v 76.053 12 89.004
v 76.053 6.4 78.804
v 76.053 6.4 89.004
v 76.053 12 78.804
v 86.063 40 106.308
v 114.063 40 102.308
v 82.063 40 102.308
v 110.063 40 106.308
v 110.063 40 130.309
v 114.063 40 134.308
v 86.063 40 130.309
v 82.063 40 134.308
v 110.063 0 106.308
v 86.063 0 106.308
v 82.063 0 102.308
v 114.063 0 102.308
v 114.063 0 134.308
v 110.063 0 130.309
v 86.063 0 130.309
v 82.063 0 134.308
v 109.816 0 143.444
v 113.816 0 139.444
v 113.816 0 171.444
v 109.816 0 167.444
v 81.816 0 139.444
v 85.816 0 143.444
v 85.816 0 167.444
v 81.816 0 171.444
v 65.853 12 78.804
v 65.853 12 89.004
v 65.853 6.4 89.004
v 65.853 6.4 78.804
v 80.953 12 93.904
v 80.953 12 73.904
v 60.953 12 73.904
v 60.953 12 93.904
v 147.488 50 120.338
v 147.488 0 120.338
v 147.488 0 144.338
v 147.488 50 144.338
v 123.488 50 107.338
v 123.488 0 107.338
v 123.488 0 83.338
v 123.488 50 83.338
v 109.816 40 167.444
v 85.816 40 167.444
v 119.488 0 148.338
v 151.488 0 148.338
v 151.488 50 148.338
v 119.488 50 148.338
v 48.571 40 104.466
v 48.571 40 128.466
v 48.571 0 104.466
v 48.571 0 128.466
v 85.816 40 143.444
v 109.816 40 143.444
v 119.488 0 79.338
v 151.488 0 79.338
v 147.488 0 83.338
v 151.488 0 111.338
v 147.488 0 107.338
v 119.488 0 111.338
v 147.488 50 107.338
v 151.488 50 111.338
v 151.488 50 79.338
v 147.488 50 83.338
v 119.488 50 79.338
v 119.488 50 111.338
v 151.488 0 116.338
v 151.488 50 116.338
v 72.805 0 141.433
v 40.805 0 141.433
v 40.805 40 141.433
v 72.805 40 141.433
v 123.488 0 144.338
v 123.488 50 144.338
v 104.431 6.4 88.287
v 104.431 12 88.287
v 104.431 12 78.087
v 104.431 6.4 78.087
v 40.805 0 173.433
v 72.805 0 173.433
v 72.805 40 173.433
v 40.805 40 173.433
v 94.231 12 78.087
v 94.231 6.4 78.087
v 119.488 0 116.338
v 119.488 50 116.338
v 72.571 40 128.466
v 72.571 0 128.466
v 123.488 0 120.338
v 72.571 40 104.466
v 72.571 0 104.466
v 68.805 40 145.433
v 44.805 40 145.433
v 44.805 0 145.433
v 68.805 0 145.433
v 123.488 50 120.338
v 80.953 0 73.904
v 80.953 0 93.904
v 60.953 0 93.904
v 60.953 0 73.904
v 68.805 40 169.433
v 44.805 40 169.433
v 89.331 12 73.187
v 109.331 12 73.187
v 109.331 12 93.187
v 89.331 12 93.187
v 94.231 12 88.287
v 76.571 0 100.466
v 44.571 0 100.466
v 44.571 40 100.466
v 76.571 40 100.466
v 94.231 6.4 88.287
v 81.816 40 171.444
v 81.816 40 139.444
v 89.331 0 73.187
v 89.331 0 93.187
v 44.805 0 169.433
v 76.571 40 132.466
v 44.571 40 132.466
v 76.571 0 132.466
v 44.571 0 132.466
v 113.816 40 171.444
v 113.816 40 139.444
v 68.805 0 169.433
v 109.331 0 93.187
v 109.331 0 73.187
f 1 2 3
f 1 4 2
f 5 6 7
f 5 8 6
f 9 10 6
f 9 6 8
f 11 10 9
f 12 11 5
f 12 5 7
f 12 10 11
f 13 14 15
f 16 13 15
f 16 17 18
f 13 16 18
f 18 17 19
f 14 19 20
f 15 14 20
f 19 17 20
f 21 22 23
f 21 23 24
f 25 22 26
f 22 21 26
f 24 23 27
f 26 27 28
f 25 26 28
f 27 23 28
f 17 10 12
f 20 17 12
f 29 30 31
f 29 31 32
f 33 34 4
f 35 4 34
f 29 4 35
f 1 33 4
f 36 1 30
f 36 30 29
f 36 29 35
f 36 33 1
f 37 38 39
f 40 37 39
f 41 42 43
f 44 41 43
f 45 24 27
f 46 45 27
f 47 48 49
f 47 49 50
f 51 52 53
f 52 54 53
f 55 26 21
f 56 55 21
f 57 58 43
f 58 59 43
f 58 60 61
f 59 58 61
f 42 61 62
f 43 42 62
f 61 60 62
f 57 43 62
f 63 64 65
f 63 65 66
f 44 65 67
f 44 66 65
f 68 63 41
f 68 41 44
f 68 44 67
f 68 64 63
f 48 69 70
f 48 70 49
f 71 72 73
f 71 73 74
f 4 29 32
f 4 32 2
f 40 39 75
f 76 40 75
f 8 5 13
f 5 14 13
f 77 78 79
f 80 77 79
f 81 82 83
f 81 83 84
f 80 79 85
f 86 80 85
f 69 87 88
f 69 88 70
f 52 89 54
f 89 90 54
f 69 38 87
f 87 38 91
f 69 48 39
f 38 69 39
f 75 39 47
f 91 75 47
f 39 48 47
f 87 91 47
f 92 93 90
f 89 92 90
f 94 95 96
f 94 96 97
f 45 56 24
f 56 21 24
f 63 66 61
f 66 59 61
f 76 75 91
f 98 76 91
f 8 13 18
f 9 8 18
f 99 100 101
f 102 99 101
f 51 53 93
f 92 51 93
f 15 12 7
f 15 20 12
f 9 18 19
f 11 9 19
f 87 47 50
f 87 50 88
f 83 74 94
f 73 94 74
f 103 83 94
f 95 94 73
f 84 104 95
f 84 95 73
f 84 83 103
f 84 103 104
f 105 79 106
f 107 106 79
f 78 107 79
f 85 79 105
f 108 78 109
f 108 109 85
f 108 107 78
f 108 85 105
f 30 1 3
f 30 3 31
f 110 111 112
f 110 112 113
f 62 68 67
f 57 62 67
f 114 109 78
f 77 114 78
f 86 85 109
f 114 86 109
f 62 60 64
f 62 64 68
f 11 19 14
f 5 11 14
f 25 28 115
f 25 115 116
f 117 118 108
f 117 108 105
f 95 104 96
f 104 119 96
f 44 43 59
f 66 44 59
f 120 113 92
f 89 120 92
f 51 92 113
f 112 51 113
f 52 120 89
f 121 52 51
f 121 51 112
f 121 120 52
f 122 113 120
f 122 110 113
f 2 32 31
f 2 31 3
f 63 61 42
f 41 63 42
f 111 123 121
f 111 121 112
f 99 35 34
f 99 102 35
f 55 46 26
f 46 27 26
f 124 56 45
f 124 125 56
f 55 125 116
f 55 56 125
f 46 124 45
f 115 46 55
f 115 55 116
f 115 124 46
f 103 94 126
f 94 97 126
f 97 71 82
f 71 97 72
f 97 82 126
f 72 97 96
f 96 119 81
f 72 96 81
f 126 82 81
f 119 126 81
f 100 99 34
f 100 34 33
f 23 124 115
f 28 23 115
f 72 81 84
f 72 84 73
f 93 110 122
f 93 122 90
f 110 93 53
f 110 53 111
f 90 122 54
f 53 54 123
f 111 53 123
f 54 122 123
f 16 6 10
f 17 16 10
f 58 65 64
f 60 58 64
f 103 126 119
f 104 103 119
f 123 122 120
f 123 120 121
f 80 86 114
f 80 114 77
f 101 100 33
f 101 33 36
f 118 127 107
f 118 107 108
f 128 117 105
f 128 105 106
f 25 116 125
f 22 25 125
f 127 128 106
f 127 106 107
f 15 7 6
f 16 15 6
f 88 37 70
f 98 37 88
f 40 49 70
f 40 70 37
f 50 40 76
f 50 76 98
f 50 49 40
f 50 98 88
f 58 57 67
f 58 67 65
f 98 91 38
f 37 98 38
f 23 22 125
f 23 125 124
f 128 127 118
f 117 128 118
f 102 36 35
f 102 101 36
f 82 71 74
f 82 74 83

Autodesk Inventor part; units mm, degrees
ref_plane "YZ Plane" through (0, 0, 0) normal (1, 0, 0) x (0, 1, 0)
ref_plane "XZ Plane" through (0, 0, 0) normal (0, 1, 0) x (-1, 0, 0)
ref_plane "XY Plane" through (0, 0, 0) normal (0, 0, 1) x (1, 0, 0)
sketch "草圖1" plane through (0, 0, 0) normal (0, 1, 0) x (-1, 0, 0)
  circle A0 centre (0, 0) radius 7
  circle A1 centre (0, 0) radius 11
  line L0 (0, 0) -> (-26.517, 0)
  line L1 (0, 0) -> (0, 28.4195)
  circle A2 centre (-26, 0) radius 7
  circle A3 centre (-26, 0) radius 11
  circle A4 centre (0, 26) radius 7
  circle A5 centre (0, 26) radius 11
  circle A6 centre (-26, 26) radius 7
  circle A7 centre (-26, 26) radius 11
  dimension "d0" = 14
  dimension "d1" = 22
  dimension "d6" = 26
  dimension "d9" = 26
sketch "草圖6" plane through (0, 0, 0) normal (0, 1, 0) x (-1, 0, 0)
  point P0 (0, 0)
sketch "草圖9" plane through (0, 0, 0) normal (0, 1, 0) x (-1, 0, 0)
  line L0 (-119.4877, 79.3379) -> (-151.4877, 79.3379)
  line L1 (-151.4877, 79.3379) -> (-151.4877, 111.3379)
  line L2 (-151.4877, 111.3379) -> (-119.4877, 111.3379)
  line L3 (-119.4877, 111.3379) -> (-119.4877, 79.3379)
  line L4 (-123.4877, 83.3379) -> (-147.4877, 83.3379)
  line L5 (-147.4877, 83.3379) -> (-147.4877, 107.3379)
  line L6 (-147.4877, 107.3379) -> (-123.4877, 107.3379)
  line L7 (-123.4877, 107.3379) -> (-123.4877, 83.3379)
  line L8 (-123.4877, 83.3379) -> (-147.4877, 107.3379) construction
  line L9 (-147.4877, 83.3379) -> (-123.4877, 107.3379) construction
  line L10 (-119.4877, 116.3379) -> (-151.4877, 116.3379)
  line L11 (-151.4877, 116.3379) -> (-151.4877, 148.3379)
  line L12 (-151.4877, 148.3379) -> (-119.4877, 148.3379)
  line L13 (-119.4877, 148.3379) -> (-119.4877, 116.3379)
  line L14 (-123.4877, 120.3379) -> (-147.4877, 120.3379)
  line L15 (-147.4877, 120.3379) -> (-147.4877, 144.3379)
  line L16 (-147.4877, 144.3379) -> (-123.4877, 144.3379)
  line L17 (-123.4877, 144.3379) -> (-123.4877, 120.3379)
  line L18 (-123.4877, 120.3379) -> (-147.4877, 144.3379) construction
  line L19 (-147.4877, 120.3379) -> (-123.4877, 144.3379) construction
  line L20 (-82.0628, 102.3085) -> (-114.0628, 102.3085)
  line L21 (-114.0628, 102.3085) -> (-114.0628, 134.3085)
  line L22 (-114.0628, 134.3085) -> (-82.0628, 134.3085)
  line L23 (-82.0628, 134.3085) -> (-82.0628, 102.3085)
  line L24 (-86.0628, 106.3085) -> (-110.0628, 106.3085)
  line L25 (-110.0628, 106.3085) -> (-110.0628, 130.3085)
  line L26 (-110.0628, 130.3085) -> (-86.0628, 130.3085)
  line L27 (-86.0628, 130.3085) -> (-86.0628, 106.3085)
  line L28 (-86.0628, 102.6348) -> (-110.0628, 126.6348) construction
  line L29 (-110.0628, 102.6348) -> (-86.0628, 126.6348) construction
  line L30 (35.5473, 81.3984) -> (3.5473, 81.3984)
  line L31 (3.5473, 81.3984) -> (3.5473, 113.3984)
  line L32 (3.5473, 113.3984) -> (35.5473, 113.3984)
  line L33 (35.5473, 113.3984) -> (35.5473, 81.3984)
  line L34 (31.5472, 85.3984) -> (7.5472, 85.3984)
  line L35 (7.5472, 85.3984) -> (7.5472, 109.3984)
  line L36 (7.5472, 109.3984) -> (31.5472, 109.3984)
  line L37 (31.5472, 109.3984) -> (31.5472, 85.3984)
  line L38 (31.5472, 85.3984) -> (7.5472, 109.3984) construction
  line L39 (7.5472, 85.3984) -> (31.5472, 109.3984) construction
  line L40 (34.8593, 41.843) -> (2.8593, 41.843)
  line L41 (30.8593, 45.843) -> (6.8593, 45.843)
  line L42 (6.8593, 45.843) -> (6.8593, 69.843)
  line L43 (2.8593, 41.843) -> (2.8593, 73.843)
  line L44 (6.8593, 69.843) -> (30.8593, 69.843)
  line L45 (30.8593, 45.843) -> (6.8593, 69.843) construction
  line L46 (6.8593, 45.843) -> (30.8593, 69.843) construction
  line L47 (2.8593, 73.843) -> (34.8593, 73.843)
  line L48 (30.8593, 69.843) -> (30.8593, 45.843)
  line L49 (34.8593, 73.843) -> (34.8593, 41.843)
  line L50 (-44.571, 100.4659) -> (-76.571, 100.4659)
  line L51 (-48.5711, 104.466) -> (-72.5711, 104.466)
  line L52 (-72.5711, 104.466) -> (-72.5711, 128.466)
  line L53 (-76.571, 100.4659) -> (-76.571, 132.4659)
  line L54 (-72.5711, 128.466) -> (-48.5711, 128.466)
  line L55 (-48.5711, 104.466) -> (-72.5711, 128.466) construction
  line L56 (-72.5711, 104.466) -> (-48.5711, 128.466) construction
  line L57 (-76.571, 132.4659) -> (-44.571, 132.4659)
  line L58 (-48.5711, 128.466) -> (-48.5711, 104.466)
  line L59 (-44.571, 132.4659) -> (-44.571, 100.4659)
  line L60 (-40.805, 141.4327) -> (-72.805, 141.4327)
  line L61 (-44.805, 145.4328) -> (-68.805, 145.4328)
  line L62 (-68.805, 145.4328) -> (-68.805, 169.4328)
  line L63 (-72.805, 141.4327) -> (-72.805, 173.4327)
  line L64 (-68.805, 169.4328) -> (-44.805, 169.4328)
  line L65 (-44.805, 145.4328) -> (-68.805, 169.4328) construction
  line L66 (-68.805, 145.4328) -> (-44.805, 169.4328) construction
  line L67 (-72.805, 173.4327) -> (-40.805, 173.4327)
  line L68 (-44.805, 169.4328) -> (-44.805, 145.4328)
  line L69 (-40.805, 173.4327) -> (-40.805, 141.4327)
  line L70 (-81.8163, 139.4435) -> (-113.8163, 139.4435)
  line L71 (-85.8164, 143.4436) -> (-109.8164, 143.4436)
  line L72 (-109.8164, 143.4436) -> (-109.8164, 167.4436)
  line L73 (-113.8163, 139.4435) -> (-113.8163, 171.4435)
  line L74 (-109.8164, 167.4436) -> (-85.8164, 167.4436)
  line L75 (-85.8164, 143.4436) -> (-109.8164, 167.4436) construction
  line L76 (-109.8164, 143.4436) -> (-85.8164, 167.4436) construction
  line L77 (-113.8163, 171.4435) -> (-81.8163, 171.4435)
  line L78 (-85.8164, 167.4436) -> (-85.8164, 143.4436)
  line L79 (-81.8163, 171.4435) -> (-81.8163, 139.4435)
  point P0 (0, 0)
  point P1 (-135.4877, 95.3379)
  point P2 (-135.4877, 132.3379)
  point P3 (-98.0628, 114.6348)
  point P4 (19.5472, 97.3984)
  point P5 (18.8593, 57.843)
  point P6 (-60.5711, 116.466)
  point P7 (-56.805, 157.4328)
  point P8 (-97.8164, 155.4436)
  dimension "d73" = 50.747
  dimension "d54" = 32
  dimension "d55" = 32
  dimension "d56" = 24
  dimension "d57" = 24
  dimension "d60" = 37
  dimension "d69" = 32
  dimension "d70" = 32
  dimension "d71" = 24
  dimension "d72" = 24
extrude "擠出9" add sketch "草圖9" along normal blind 50 contours L0 L1 L2 L3 | L10 L11 L12 L13
extrude "擠出10" add sketch "草圖9" along normal blind 40 contours L20 L21 L22 L23 | L50 L53 L57 L59 | L60 L63 L67 L69 | L70 L73 L77 L79
sketch "草圖10" plane through (0, 0, 0) normal (0, 1, 0) x (-1, 0, 0)
  line L0 (48.2716, 184.5725) -> (-274.6912, 184.5725)
  line L1 (-274.6912, 184.5725) -> (-274.6912, -18.9692)
  line L2 (-274.6912, -18.9692) -> (48.2716, -18.9692)
  line L3 (48.2716, -18.9692) -> (48.2716, 184.5725)
  point P0 (0, 0)
  dimension "d99" = 322.9628
  dimension "d100" = 203.5417
sketch "草圖11" plane through (0, 0, 0) normal (0, 1, 0) x (-1, 0, 0)
  line L0 (35.0654, 155.7952) -> (13.0654, 155.7952)
  line L1 (13.0654, 155.7952) -> (13.0654, 177.7952)
  line L2 (13.0654, 177.7952) -> (35.0654, 177.7952)
  line L3 (35.0654, 177.7952) -> (35.0654, 155.7952)
  line L4 (4.7905, 155.7952) -> (-17.2095, 155.7952)
  line L5 (-17.2095, 155.7952) -> (-17.2095, 177.7952)
  line L6 (-17.2095, 177.7952) -> (4.7905, 177.7952)
  line L7 (4.7905, 177.7952) -> (4.7905, 155.7952)
  point P0 (0, 0)
  dimension "d101" = 22
  dimension "d102" = 22
  dimension "d103" = 22
  dimension "d104" = 22
sketch "草圖12" plane through (0, 0, 0) normal (0, 1, 0) x (-1, 0, 0)
  line L0 (-109.331, 73.1874) -> (-109.331, 93.1874)
  line L1 (-109.331, 93.1874) -> (-89.331, 93.1874)
  line L2 (-89.331, 93.1874) -> (-89.331, 73.1874)
  line L3 (-89.331, 73.1874) -> (-109.331, 73.1874)
  line L4 (-80.953, 73.904) -> (-80.953, 93.904)
  line L5 (-80.953, 93.904) -> (-60.953, 93.904)
  line L6 (-60.953, 93.904) -> (-60.953, 73.904)
  line L7 (-60.953, 73.904) -> (-80.953, 73.904)
  line L8 (-38.2379, 177.9784) -> (-158.2379, 177.9784)
  line L9 (-158.2379, 177.9784) -> (-158.2379, 57.9784)
  line L10 (-158.2379, 57.9784) -> (-38.2379, 57.9784)
  line L11 (-38.2379, 57.9784) -> (-38.2379, 177.9784)
  point P0 (0, 0)
  dimension "d105" = 20
  dimension "d106" = 20
  dimension "d107" = 20
  dimension "d108" = 20
  dimension "d137" = 120
  dimension "d138" = 120
extrude "擠出12" add sketch "草圖12" along normal blind 12 contours L0 L1 L2 L3 | L4 L5 L6 L7
sketch "草圖13" plane through (0, 12, 0) normal (0, 1, 0) x (1, 0, 0)
  line L0 (60.953, -73.904) -> (60.953, -93.904) projected
  line L1 (80.953, -93.904) -> (80.953, -73.904) projected
  line L2 (60.953, -93.904) -> (80.953, -73.904)
  line L3 (89.331, -93.1874) -> (109.331, -93.1874) projected
  line L4 (109.331, -93.1874) -> (109.331, -73.1874) projected
  line L5 (89.331, -93.1874) -> (109.331, -73.1874)
  line L6 (-13.0654, -155.7952) -> (-35.0654, -155.7952) projected
  line L7 (-35.0654, -177.7952) -> (-13.0654, -177.7952) projected
  line L8 (-35.0654, -155.7952) -> (-13.0654, -177.7952)
  line L9 (-4.7905, -177.7952) -> (17.2095, -177.7952) projected
  line L10 (-4.7905, -155.7952) -> (17.2095, -177.7952)
  line L11 (-31.0654, -159.7952) -> (-17.0654, -159.7952)
  line L12 (-17.0654, -159.7952) -> (-17.0654, -173.7952)
  line L13 (-17.0654, -173.7952) -> (-31.0654, -173.7952)
  line L14 (-31.0654, -173.7952) -> (-31.0654, -159.7952)
  line L15 (-31.0654, -159.7952) -> (-17.0654, -173.7952) construction
  line L16 (-17.0654, -159.7952) -> (-31.0654, -173.7952) construction
  line L17 (-0.7905, -173.7952) -> (13.2095, -173.7952)
  line L18 (13.2095, -173.7952) -> (13.2095, -159.7952)
  line L19 (13.2095, -159.7952) -> (-0.7905, -159.7952)
  line L20 (-0.7905, -159.7952) -> (-0.7905, -173.7952)
  line L21 (-0.7905, -173.7952) -> (13.2095, -159.7952) construction
  line L22 (13.2095, -173.7952) -> (-0.7905, -159.7952) construction
  line L23 (65.853, -78.804) -> (76.053, -78.804)
  line L24 (76.053, -78.804) -> (76.053, -89.004)
  line L25 (76.053, -89.004) -> (65.853, -89.004)
  line L26 (65.853, -89.004) -> (65.853, -78.804)
  line L27 (65.853, -78.804) -> (76.053, -89.004) construction
  line L28 (76.053, -78.804) -> (65.853, -89.004) construction
  line L29 (94.231, -88.2874) -> (104.431, -88.2874)
  line L30 (104.431, -88.2874) -> (104.431, -78.0874)
  line L31 (104.431, -78.0874) -> (94.231, -78.0874)
  line L32 (94.231, -78.0874) -> (94.231, -88.2874)
  line L33 (94.231, -88.2874) -> (104.431, -78.0874) construction
  line L34 (104.431, -88.2874) -> (94.231, -78.0874) construction
  point P0 (0, 0)
  point P1 (-24.0654, -166.7952)
  point P2 (6.2095, -166.7952)
  point P3 (70.953, -83.904)
  point P4 (99.331, -83.1874)
  dimension "d113" = 14
  dimension "d114" = 14
  dimension "d115" = 14
  dimension "d116" = 14
  dimension "d117" = 10.2
  dimension "d118" = 10.2
  dimension "d119" = 10.2
  dimension "d120" = 10.2
extrude "擠出13" cut sketch "草圖13" against normal blind 5.6 contours L26 L23 L2 | L2 L24 L25 | L32 L31 L5 | L5 L30 L29 | L11 L12 L8 | L8 L13 L14 | L19 L18 L10 | L10 L17 L20
sketch "草圖15" plane through (0, 0, 0) normal (0, 1, 0) x (-1, 0, 0)
  line L0 (41.1091, -16.1505) -> (-78.8909, -16.1505)
  line L1 (-78.8909, -16.1505) -> (-78.8909, 103.8495)
  line L2 (-78.8909, 103.8495) -> (41.1091, 103.8495)
  line L3 (41.1091, 103.8495) -> (41.1091, -16.1505)
  point P0 (0, 0)
  dimension "d135" = 120
  dimension "d136" = 120
properties part number "axie3"
